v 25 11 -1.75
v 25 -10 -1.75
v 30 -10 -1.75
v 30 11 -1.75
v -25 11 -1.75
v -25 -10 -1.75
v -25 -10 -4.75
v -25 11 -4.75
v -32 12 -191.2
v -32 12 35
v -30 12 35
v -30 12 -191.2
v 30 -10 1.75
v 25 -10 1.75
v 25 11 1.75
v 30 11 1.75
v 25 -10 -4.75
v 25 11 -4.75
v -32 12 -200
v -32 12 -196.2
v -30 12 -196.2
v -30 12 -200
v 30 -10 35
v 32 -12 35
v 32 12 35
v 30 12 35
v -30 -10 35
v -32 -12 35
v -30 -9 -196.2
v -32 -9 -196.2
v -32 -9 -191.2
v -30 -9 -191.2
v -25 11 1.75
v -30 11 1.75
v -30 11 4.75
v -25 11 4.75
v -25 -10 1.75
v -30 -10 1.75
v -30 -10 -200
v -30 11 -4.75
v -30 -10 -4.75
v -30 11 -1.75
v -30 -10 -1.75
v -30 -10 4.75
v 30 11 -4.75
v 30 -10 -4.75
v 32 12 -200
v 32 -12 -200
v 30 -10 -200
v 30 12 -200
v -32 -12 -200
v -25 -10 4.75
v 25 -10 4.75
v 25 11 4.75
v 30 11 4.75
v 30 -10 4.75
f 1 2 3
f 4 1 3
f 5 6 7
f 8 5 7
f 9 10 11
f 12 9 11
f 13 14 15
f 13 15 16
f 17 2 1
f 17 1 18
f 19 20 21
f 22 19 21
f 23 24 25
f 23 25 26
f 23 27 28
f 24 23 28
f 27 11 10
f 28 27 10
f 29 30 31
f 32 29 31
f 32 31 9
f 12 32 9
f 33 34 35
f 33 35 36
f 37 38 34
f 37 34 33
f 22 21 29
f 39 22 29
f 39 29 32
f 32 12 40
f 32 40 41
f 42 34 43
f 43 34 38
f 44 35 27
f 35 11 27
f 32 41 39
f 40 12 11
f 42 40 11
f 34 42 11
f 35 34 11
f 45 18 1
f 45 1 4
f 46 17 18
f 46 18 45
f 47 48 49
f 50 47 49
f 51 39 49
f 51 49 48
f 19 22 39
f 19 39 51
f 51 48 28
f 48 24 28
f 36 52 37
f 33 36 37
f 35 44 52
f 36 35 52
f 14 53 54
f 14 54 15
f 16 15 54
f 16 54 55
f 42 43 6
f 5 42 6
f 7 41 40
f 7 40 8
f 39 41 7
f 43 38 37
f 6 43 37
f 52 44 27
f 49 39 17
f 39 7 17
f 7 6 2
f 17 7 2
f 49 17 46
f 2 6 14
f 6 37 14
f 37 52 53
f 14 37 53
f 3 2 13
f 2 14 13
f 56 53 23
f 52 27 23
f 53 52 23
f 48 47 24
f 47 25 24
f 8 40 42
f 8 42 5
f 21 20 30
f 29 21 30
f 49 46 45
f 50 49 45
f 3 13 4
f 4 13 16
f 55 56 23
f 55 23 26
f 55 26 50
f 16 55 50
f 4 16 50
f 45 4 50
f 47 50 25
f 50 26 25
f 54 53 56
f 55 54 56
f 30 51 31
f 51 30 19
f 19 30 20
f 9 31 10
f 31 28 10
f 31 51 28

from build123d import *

# Parameters (mm, degrees)
BOSS_EXTRUDE1_DEPTH      = 35
BOSS_EXTRUDE1_DEPTH_BACK = 45
BOSS_EXTRUDE3_DEPTH      = 155
SKETCH5_W                = 5
SKETCH5_H                = 3
BOSS_EXTRUDE5_DEPTH      = 21
CUT_EXTRUDE1_DEPTH       = 10


with BuildPart() as part:
    # Sketch1 → Boss-Extrude1 (new, two sides: drawn at the far end of the back side and taken through both)
    with BuildSketch(Plane.XY.offset(-BOSS_EXTRUDE1_DEPTH_BACK)):
        Polygon((-30, 12), (-30, 10), (-30, -10), (30, -10), (30, 10), (30, 12), (32, 12), (32, -12), (-32, -12), (-32, 12), align=None)
    extrude(amount=BOSS_EXTRUDE1_DEPTH + BOSS_EXTRUDE1_DEPTH_BACK)

    # Sketch3 → Boss-Extrude3 (add)
    with BuildSketch(Plane(origin=(0, 0, -45), x_dir=(-1, 0, 0), z_dir=(0, 0, -1))):
        Polygon((-30, -10), (-30, 12), (-32, 12), (-32, -12), (32, -12), (32, 12), (30, 12), (30, -10), align=None)
    extrude(amount=BOSS_EXTRUDE3_DEPTH)

    # Sketch5 → Boss-Extrude5 (add)
    with BuildSketch(Plane(origin=(0, -10, 0), x_dir=(1, 0, 0), z_dir=(0, 1, 0))):
        with Locations((-27.5, -3.25)):
            Rectangle(SKETCH5_W, SKETCH5_H)
        with Locations((-27.5, 3.25)):
            Rectangle(SKETCH5_W, SKETCH5_H)
        with Locations((27.5, -3.25)):
            Rectangle(SKETCH5_W, SKETCH5_H)
        with Locations((27.5, 3.25)):
            Rectangle(SKETCH5_W, SKETCH5_H)
    extrude(amount=BOSS_EXTRUDE5_DEPTH)

    # Sketch6 → Cut-Extrude1 (cut)
    with BuildSketch(Plane.ZY.offset(32)):
        Polygon((-196.2, 9), (-196.2, -9), (-191.2, -9), (-191.2, 9), (-191.2, 12), (-196.2, 12), align=None)
    extrude(amount=-CUT_EXTRUDE1_DEPTH, mode=Mode.SUBTRACT)


solid = part.part
